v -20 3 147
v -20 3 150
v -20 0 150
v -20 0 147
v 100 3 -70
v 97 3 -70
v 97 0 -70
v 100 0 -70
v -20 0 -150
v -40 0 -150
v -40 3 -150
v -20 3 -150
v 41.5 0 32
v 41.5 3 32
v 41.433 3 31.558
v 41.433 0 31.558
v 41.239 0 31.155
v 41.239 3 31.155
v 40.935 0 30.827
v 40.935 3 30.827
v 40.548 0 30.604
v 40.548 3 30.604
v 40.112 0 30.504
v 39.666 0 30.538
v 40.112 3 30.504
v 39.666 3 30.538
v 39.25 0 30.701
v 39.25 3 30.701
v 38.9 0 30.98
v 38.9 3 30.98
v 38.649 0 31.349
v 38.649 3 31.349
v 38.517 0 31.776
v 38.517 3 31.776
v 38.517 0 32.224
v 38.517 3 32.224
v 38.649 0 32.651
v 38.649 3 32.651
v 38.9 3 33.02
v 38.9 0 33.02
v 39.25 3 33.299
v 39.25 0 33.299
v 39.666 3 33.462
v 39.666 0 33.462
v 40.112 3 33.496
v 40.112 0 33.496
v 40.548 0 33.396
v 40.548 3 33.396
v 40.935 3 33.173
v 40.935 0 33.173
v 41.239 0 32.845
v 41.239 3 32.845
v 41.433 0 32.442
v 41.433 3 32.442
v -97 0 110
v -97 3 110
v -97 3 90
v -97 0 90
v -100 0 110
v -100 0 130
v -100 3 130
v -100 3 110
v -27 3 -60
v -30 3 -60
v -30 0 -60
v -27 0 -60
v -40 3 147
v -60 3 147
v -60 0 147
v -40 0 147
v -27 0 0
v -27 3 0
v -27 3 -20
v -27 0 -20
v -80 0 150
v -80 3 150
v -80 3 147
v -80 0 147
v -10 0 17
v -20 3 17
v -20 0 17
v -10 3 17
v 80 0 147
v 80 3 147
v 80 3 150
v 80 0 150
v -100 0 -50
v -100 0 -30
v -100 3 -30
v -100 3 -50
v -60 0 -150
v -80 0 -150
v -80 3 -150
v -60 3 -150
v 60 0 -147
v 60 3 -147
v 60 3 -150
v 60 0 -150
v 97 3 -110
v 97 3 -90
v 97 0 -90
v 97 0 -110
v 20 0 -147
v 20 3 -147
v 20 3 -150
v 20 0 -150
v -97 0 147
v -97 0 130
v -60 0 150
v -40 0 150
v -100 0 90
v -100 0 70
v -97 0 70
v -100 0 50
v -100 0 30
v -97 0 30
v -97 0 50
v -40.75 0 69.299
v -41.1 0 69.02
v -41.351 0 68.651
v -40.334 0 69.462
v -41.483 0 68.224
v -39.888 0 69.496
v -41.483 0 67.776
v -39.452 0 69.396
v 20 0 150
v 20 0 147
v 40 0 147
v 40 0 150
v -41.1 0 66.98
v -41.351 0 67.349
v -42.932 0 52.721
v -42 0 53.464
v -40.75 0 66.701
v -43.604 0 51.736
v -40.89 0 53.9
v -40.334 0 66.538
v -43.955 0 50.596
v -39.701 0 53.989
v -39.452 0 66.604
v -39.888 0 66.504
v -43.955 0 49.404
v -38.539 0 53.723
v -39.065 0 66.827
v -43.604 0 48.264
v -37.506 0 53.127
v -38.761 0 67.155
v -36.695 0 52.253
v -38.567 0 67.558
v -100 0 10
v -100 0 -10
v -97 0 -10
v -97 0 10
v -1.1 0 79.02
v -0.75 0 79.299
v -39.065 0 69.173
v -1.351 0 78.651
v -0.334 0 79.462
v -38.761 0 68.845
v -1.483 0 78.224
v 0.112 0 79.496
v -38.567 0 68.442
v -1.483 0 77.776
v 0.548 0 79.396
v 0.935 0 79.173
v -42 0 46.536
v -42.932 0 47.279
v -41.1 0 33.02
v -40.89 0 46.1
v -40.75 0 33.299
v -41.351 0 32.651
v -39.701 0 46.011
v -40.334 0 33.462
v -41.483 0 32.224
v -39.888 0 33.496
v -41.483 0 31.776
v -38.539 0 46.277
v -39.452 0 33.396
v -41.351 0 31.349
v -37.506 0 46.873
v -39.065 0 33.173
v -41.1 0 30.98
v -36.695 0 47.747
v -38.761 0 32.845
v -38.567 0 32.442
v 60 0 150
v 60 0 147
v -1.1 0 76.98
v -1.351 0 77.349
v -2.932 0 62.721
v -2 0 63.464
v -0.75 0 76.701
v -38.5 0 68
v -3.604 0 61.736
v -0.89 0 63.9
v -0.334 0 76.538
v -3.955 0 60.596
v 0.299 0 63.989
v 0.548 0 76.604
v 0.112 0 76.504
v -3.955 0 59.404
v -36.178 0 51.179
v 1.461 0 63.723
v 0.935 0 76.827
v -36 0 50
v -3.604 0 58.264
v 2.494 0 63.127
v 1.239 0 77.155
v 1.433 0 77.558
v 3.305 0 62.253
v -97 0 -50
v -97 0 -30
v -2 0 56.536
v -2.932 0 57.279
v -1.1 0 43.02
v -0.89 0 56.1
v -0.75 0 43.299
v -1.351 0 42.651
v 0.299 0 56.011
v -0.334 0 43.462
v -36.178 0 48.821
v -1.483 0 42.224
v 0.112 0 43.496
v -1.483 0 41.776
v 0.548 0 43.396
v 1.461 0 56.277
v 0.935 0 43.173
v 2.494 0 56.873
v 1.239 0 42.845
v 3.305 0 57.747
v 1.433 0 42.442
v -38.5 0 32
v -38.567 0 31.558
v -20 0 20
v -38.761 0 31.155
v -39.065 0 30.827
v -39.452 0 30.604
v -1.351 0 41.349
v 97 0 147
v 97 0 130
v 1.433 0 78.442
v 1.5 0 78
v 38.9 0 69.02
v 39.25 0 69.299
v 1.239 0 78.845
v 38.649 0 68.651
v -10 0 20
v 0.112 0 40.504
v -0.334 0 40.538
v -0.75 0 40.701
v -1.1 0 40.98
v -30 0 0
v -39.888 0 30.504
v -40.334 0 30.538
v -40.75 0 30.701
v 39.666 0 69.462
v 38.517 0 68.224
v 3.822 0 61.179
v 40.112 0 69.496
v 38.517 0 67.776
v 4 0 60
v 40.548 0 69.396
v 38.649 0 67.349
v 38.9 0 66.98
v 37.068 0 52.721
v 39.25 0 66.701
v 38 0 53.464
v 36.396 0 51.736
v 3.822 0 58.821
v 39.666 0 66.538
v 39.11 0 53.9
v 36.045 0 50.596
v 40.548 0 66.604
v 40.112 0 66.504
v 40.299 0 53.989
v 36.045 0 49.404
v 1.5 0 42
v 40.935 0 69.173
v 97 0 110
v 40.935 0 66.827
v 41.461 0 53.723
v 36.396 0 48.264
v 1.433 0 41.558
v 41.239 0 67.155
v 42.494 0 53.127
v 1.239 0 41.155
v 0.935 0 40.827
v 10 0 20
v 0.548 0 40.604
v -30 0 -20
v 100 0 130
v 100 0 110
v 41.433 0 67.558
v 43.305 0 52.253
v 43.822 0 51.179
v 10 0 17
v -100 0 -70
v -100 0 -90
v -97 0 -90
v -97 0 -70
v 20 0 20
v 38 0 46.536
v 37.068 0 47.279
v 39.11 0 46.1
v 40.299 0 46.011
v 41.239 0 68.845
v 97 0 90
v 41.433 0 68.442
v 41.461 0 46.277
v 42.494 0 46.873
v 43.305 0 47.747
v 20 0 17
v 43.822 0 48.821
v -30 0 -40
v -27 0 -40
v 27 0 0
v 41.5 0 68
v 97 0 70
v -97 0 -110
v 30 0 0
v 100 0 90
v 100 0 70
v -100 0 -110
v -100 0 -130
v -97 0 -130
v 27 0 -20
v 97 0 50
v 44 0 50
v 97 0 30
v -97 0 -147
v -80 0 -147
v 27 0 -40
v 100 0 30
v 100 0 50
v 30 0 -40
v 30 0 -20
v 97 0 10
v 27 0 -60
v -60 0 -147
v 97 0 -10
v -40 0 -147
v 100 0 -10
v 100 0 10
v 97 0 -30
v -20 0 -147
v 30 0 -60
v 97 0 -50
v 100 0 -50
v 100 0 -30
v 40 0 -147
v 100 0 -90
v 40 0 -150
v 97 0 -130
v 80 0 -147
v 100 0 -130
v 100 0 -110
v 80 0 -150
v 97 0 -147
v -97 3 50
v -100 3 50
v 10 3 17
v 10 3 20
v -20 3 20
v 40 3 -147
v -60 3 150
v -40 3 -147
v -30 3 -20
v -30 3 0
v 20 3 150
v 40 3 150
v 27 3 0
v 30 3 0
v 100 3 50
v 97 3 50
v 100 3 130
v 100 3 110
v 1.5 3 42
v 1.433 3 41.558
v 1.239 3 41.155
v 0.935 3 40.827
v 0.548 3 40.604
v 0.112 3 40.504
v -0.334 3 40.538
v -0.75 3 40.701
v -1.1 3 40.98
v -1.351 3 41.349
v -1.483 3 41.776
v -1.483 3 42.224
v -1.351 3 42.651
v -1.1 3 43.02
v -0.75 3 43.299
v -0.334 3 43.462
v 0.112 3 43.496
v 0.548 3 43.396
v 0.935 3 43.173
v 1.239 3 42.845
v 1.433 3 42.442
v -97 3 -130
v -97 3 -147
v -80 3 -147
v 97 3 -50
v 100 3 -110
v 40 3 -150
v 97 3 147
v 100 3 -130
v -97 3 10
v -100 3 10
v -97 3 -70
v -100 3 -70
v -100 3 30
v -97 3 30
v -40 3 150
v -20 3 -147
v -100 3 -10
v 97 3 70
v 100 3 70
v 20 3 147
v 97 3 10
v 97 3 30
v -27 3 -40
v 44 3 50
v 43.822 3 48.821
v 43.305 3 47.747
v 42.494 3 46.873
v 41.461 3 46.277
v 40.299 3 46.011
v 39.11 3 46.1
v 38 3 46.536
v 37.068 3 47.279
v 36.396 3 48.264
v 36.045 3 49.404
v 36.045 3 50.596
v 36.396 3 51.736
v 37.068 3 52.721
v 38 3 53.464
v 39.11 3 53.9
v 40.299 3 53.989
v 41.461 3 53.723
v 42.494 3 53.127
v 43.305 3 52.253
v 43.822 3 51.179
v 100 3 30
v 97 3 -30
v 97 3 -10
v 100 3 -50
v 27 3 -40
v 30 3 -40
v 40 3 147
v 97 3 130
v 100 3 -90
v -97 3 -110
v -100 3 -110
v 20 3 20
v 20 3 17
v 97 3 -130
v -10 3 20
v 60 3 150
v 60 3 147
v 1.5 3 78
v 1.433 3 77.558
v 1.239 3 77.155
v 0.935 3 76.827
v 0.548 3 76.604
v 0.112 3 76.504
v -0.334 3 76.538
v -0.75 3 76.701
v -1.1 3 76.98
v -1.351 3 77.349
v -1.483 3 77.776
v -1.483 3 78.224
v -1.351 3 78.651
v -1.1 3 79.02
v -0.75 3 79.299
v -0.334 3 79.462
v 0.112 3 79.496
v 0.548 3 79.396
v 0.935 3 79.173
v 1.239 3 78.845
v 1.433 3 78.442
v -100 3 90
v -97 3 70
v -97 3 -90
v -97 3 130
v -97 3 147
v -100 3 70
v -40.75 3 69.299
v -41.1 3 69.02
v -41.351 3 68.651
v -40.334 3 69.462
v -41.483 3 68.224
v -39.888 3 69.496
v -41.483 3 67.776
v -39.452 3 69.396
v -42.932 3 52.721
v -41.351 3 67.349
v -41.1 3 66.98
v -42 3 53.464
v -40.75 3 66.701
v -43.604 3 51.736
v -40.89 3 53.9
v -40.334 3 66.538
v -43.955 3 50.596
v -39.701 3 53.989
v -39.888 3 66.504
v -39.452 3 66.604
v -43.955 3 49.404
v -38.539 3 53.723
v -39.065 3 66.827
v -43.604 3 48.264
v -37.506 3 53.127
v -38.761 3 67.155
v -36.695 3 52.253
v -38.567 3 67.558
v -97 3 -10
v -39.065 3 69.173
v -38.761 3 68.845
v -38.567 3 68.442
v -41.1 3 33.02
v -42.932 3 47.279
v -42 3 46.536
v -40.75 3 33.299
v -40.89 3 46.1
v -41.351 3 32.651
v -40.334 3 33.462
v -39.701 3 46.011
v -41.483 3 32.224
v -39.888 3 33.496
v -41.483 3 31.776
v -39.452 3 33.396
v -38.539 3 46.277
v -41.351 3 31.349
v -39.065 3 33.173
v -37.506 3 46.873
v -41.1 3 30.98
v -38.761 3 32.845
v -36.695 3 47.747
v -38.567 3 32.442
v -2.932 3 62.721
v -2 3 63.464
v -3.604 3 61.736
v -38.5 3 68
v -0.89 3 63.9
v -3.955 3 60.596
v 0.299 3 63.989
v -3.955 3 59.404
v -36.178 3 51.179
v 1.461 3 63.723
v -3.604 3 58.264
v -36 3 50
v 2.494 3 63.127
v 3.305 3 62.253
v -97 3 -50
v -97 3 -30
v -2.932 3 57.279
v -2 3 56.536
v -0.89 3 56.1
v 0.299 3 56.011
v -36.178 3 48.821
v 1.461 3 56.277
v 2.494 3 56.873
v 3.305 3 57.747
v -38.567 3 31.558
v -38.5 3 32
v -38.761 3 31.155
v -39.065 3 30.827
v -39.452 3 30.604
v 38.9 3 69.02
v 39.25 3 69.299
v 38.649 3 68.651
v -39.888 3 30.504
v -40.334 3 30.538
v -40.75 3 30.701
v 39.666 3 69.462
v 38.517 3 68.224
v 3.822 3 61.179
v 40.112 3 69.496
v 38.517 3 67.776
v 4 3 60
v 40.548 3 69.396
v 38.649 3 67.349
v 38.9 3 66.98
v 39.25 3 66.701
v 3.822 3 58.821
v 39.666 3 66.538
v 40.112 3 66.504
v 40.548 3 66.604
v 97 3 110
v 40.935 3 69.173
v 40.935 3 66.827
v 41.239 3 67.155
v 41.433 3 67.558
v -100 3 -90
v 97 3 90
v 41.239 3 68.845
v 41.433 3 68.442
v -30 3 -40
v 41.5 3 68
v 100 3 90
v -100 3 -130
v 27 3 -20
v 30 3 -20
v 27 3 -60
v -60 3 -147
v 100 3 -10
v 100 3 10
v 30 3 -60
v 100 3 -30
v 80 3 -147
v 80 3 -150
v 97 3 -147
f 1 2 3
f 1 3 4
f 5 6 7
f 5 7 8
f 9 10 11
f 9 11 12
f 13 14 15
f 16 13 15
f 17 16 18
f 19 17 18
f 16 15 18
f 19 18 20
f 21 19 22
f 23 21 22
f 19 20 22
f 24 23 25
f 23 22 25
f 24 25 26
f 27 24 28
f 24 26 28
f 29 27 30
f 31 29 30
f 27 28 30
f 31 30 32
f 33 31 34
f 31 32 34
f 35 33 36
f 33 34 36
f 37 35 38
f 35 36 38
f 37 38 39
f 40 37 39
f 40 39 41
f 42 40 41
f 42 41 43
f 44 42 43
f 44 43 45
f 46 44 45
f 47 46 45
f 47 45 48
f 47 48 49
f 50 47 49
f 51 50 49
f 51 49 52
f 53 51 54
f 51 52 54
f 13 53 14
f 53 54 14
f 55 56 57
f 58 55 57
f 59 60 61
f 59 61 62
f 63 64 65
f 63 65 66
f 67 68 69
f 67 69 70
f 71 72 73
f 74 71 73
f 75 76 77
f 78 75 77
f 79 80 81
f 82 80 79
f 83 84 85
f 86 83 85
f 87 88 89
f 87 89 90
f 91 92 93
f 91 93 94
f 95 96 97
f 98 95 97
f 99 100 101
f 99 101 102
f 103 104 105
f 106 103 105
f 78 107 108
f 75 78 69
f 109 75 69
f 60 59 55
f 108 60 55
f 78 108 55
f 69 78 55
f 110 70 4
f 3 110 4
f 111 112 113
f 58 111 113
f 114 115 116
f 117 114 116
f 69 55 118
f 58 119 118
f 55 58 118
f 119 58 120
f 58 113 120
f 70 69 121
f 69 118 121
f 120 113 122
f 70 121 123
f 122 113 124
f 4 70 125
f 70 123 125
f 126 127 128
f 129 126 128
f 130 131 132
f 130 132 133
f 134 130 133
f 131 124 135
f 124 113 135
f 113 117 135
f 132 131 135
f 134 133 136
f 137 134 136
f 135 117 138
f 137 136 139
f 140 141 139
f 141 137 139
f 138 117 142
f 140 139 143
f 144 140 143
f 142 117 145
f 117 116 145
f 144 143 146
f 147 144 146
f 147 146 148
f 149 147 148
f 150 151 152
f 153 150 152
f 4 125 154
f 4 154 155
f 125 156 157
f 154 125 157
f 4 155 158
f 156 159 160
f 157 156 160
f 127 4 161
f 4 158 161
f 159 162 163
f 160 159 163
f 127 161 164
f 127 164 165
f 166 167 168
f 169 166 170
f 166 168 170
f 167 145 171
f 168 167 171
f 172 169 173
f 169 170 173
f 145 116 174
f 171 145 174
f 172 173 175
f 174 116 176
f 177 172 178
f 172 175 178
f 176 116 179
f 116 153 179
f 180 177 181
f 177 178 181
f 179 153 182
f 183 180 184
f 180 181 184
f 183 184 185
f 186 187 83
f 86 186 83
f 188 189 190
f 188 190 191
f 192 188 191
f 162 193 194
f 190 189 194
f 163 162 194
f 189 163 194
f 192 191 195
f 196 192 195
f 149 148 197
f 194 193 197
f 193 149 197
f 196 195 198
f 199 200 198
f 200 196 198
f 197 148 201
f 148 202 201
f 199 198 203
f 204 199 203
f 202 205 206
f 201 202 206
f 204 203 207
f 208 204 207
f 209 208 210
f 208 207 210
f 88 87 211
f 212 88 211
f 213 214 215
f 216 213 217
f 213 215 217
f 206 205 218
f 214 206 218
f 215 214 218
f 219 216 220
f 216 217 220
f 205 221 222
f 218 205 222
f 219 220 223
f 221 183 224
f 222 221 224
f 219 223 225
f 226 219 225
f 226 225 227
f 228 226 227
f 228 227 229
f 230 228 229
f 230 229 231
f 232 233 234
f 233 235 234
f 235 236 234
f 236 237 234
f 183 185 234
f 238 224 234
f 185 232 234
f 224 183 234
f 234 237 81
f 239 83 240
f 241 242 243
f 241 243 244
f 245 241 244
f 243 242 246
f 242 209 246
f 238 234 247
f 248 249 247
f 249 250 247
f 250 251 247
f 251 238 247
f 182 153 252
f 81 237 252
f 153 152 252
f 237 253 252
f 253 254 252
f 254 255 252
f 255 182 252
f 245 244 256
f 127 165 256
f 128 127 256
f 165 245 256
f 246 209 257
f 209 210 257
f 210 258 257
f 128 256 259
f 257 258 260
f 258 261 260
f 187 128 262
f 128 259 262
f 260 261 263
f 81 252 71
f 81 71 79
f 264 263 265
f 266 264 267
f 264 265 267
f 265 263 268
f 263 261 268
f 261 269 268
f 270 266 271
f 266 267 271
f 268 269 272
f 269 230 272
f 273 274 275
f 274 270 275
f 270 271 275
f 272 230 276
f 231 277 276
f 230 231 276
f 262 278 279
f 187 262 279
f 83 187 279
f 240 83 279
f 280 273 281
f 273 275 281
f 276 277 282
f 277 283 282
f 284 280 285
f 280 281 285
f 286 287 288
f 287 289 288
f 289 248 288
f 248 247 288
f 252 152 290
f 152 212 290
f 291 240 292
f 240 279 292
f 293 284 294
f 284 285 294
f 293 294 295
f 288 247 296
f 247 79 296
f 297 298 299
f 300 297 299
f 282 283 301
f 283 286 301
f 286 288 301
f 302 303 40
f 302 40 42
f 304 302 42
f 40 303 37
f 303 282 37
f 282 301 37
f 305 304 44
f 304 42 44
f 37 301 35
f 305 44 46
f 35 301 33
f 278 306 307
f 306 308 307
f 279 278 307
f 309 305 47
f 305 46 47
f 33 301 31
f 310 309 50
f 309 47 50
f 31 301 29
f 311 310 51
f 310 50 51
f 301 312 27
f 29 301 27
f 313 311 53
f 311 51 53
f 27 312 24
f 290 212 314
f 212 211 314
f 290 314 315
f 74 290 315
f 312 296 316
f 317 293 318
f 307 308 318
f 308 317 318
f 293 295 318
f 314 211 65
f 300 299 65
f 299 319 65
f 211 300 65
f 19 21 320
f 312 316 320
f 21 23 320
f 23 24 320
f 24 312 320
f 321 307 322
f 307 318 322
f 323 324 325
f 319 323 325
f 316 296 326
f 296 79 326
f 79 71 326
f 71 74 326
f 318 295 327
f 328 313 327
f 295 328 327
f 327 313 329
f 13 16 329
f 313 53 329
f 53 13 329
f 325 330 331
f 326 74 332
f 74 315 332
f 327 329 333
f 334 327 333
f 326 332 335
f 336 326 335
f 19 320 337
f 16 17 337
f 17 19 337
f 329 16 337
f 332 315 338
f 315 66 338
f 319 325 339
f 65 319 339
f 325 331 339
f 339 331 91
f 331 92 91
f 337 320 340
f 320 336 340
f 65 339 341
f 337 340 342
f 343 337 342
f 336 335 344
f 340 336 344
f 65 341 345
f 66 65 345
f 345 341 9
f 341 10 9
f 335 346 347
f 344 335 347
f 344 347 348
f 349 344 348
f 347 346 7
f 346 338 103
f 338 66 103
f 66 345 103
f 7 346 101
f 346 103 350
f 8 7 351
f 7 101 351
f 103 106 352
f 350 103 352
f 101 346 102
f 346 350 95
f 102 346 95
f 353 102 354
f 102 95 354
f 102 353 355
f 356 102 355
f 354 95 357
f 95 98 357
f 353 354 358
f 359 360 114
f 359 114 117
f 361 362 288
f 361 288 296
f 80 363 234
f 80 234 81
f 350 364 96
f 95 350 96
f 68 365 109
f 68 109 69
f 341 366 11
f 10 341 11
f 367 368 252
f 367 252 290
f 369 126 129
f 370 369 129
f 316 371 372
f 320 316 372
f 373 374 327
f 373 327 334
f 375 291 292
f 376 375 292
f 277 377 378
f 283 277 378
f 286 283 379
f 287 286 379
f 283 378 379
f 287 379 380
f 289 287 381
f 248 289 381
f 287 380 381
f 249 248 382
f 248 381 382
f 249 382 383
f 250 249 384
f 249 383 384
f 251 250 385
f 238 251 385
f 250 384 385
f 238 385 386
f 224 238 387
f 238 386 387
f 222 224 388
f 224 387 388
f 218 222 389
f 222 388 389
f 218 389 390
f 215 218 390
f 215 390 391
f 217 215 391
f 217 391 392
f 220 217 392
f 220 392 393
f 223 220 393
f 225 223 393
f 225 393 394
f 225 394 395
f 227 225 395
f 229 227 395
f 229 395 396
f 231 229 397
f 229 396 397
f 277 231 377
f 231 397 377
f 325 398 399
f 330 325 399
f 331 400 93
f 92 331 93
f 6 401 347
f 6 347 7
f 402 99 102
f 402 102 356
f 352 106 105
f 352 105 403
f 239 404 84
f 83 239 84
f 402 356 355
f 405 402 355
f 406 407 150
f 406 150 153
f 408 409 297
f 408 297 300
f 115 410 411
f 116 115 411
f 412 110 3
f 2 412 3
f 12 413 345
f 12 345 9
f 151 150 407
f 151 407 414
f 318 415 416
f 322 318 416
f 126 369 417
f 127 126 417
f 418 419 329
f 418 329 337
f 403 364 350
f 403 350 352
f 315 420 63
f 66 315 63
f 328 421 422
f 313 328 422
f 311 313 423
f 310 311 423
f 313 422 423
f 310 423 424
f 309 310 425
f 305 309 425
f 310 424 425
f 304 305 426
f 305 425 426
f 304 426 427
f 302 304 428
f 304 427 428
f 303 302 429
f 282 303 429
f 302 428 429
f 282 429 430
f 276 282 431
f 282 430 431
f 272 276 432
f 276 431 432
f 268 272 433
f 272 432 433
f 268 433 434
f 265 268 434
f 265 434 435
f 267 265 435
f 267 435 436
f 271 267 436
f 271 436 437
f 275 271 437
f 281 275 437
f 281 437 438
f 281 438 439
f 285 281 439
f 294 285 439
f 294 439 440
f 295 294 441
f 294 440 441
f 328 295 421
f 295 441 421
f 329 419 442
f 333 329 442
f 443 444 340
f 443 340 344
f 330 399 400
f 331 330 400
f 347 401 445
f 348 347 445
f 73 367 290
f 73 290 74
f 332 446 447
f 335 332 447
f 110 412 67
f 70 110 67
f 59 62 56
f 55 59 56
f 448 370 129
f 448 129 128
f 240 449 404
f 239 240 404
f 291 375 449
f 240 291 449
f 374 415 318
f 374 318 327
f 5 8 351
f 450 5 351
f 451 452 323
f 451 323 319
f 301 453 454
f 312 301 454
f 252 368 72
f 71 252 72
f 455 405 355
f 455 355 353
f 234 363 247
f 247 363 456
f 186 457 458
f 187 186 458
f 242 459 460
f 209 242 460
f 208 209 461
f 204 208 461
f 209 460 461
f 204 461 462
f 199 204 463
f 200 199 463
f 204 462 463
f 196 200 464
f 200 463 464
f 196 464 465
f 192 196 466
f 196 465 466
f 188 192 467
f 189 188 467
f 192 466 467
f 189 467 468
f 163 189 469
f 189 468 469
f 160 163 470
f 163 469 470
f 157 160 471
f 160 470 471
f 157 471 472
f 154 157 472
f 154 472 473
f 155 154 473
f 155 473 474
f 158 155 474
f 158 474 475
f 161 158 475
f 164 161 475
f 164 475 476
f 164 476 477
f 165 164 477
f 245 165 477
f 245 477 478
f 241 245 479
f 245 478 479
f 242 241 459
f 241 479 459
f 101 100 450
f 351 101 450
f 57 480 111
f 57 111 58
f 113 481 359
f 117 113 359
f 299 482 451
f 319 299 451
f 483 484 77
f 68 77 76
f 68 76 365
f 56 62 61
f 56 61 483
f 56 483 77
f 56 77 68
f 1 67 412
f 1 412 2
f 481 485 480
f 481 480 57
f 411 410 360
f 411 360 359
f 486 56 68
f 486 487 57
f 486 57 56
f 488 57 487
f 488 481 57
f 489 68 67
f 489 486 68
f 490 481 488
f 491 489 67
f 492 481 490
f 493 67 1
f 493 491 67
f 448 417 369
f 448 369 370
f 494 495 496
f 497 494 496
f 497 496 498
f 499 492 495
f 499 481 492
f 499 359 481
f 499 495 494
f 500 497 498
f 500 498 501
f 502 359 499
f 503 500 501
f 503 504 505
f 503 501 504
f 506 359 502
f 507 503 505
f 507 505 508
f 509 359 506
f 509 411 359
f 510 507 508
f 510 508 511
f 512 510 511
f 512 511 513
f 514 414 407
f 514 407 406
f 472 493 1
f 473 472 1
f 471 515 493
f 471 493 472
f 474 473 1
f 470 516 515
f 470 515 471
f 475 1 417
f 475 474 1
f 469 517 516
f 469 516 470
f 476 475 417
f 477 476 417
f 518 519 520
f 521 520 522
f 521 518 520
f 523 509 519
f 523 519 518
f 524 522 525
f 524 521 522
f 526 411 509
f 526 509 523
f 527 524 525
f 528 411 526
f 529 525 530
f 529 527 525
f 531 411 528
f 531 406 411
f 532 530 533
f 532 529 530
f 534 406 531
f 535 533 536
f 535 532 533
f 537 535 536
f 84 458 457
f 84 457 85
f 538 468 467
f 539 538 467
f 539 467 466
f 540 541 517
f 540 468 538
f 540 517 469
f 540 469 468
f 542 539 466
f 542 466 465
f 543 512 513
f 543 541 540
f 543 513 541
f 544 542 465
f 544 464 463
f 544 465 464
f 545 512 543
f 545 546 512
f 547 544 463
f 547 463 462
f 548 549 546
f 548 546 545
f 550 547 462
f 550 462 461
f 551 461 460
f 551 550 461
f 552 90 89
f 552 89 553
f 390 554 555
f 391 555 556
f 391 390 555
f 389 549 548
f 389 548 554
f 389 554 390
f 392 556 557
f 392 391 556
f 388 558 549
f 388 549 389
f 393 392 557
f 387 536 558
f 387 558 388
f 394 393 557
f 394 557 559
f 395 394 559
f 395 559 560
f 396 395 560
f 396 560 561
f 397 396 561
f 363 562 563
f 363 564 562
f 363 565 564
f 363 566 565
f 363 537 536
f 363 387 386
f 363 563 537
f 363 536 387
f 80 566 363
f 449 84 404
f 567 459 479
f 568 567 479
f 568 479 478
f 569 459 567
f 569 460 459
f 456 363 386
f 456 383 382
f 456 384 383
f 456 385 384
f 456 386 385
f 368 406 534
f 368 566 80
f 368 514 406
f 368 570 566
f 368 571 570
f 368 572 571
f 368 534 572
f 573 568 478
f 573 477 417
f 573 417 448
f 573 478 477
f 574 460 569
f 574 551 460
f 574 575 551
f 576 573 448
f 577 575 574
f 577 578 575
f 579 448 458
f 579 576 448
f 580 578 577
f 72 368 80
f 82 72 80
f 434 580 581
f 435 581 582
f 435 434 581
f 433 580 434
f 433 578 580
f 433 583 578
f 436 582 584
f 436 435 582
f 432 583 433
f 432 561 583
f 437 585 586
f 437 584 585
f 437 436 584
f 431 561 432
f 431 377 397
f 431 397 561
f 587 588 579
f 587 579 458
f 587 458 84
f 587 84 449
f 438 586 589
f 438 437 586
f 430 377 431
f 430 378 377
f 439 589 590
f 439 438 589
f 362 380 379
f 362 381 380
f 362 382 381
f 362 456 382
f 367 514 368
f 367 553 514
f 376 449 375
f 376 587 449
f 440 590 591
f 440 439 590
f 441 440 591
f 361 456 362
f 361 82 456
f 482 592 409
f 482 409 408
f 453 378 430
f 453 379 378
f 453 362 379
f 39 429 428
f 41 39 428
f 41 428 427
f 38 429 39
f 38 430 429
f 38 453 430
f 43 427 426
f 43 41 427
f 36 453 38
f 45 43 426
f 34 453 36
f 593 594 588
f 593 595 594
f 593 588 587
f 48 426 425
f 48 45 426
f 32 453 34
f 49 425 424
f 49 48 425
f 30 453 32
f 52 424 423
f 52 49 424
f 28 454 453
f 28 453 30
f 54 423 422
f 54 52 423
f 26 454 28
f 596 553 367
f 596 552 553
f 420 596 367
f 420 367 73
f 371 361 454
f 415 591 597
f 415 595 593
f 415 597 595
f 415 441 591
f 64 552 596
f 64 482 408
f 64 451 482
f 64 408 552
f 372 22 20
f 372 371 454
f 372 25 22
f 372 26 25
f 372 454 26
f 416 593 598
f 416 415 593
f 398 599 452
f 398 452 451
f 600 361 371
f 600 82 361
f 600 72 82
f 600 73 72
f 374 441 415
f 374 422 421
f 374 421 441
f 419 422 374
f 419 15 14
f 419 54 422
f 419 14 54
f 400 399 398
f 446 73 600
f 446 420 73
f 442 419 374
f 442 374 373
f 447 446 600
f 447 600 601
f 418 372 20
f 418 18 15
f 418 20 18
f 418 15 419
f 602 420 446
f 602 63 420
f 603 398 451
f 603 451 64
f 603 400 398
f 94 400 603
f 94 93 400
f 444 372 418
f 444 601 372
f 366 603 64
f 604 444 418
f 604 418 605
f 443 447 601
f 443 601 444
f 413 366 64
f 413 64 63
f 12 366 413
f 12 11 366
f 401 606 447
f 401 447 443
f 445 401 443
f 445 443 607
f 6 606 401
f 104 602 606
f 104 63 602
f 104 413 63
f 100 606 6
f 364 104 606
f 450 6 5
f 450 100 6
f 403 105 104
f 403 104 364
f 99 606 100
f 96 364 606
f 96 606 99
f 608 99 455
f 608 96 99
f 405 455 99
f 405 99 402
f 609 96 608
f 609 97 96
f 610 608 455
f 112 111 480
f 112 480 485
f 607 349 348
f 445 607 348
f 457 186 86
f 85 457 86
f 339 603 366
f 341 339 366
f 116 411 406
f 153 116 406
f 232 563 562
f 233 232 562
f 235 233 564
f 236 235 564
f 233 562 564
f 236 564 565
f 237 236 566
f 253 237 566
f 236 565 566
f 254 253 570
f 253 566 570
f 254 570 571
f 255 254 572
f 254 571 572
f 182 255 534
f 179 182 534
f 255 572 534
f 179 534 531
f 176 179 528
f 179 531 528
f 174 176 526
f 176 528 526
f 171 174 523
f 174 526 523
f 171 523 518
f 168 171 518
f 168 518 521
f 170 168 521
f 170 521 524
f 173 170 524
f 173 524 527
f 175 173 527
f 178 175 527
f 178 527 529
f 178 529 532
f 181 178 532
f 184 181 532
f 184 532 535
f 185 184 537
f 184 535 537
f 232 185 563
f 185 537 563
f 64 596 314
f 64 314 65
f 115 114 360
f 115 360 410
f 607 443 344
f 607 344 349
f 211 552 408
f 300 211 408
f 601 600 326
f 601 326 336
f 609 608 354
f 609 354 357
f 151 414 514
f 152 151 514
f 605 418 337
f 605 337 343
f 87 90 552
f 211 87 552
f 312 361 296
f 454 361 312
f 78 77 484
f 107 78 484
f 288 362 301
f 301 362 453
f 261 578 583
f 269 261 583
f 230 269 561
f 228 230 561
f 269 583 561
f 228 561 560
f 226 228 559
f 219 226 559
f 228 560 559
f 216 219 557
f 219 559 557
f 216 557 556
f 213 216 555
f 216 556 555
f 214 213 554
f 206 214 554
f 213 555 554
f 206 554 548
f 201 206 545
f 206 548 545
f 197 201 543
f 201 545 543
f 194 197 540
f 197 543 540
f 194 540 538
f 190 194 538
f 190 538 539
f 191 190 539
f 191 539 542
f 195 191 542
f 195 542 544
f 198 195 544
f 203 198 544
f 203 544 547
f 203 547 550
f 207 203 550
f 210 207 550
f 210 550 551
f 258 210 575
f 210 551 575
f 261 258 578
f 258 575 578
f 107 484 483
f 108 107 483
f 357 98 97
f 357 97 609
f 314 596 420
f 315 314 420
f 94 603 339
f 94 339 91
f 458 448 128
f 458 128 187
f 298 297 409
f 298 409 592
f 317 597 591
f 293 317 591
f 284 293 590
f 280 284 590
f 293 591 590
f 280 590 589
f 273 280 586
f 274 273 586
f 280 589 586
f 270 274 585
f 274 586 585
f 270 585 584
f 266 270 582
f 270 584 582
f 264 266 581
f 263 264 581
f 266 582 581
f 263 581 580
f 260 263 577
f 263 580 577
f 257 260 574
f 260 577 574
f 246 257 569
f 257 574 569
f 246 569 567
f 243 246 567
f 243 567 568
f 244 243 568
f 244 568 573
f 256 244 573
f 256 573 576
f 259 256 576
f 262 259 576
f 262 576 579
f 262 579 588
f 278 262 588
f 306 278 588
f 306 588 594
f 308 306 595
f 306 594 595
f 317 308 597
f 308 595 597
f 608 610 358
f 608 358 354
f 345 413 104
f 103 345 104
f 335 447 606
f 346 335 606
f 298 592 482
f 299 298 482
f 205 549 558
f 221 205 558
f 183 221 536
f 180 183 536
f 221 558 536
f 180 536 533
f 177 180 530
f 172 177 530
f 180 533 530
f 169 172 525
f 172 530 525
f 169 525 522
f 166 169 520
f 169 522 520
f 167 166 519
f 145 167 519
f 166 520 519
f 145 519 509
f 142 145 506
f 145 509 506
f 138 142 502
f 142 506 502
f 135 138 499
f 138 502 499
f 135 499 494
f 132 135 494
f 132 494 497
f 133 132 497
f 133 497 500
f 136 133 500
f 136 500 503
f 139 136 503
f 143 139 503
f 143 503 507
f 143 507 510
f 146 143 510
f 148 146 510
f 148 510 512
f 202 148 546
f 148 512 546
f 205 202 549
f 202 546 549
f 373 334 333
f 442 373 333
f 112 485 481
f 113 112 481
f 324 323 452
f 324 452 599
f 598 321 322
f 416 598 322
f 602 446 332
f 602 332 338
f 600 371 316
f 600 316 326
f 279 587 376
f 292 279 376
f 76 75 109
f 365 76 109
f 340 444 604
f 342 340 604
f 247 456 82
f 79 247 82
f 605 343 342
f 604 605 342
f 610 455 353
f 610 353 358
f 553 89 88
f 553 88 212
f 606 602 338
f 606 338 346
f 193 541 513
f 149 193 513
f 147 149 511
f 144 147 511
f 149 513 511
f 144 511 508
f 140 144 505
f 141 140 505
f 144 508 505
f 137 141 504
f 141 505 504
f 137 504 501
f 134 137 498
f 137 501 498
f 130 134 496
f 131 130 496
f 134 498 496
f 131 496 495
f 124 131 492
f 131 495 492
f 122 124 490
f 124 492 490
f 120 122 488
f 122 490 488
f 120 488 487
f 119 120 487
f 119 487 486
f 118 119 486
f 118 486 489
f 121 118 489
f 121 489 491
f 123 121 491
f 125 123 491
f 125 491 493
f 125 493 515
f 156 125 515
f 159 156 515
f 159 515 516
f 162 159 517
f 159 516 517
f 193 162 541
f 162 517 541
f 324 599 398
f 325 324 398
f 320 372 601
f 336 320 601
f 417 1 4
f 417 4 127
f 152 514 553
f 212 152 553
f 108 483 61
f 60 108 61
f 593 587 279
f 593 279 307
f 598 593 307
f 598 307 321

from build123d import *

# Parameters (mm, degrees)
SKETCH1_W           = 200
SKETCH1_H           = 300
BOSS_EXTRUDE1_DEPTH = 3
SKETCH2_W           = 3
SKETCH2_H           = 20
SKETCH2_W_2         = 10
SKETCH2_H_2         = 3
CUT_EXTRUDE1_DEPTH  = 3
SKETCH3_W           = 3
SKETCH3_H           = 20
SKETCH3_W_2         = 20
SKETCH3_H_2         = 3
SKETCH3_W_3         = 40
CUT_EXTRUDE2_DEPTH  = 3
SKETCH4_R           = 4
SKETCH4_R_2         = 1.5
CUT_EXTRUDE3_DEPTH  = 3


with BuildPart() as part:
    # Sketch1 → Boss-Extrude1 (new body)
    with BuildSketch(Plane(origin=(0, 0, 0), x_dir=(1, 0, 0), z_dir=(0, 1, 0))):
        Rectangle(SKETCH1_W, SKETCH1_H)
    extrude(amount=BOSS_EXTRUDE1_DEPTH)

    # Sketch2 → Cut-Extrude1 (cut)
    with BuildSketch(Plane(origin=(0, 3, 0), x_dir=(1, 0, 0), z_dir=(0, 1, 0))):
        with Locations((-28.5, 10)):
            Rectangle(SKETCH2_W, SKETCH2_H)
        with Locations((28.5, 10)):
            Rectangle(SKETCH2_W, SKETCH2_H)
        with Locations((15, -18.5)):
            Rectangle(SKETCH2_W_2, SKETCH2_H_2)
        with Locations((28.5, 50)):
            Rectangle(SKETCH2_W, SKETCH2_H)
        with Locations((-28.5, 50)):
            Rectangle(SKETCH2_W, SKETCH2_H)
        with Locations((-15, -18.5)):
            Rectangle(SKETCH2_W_2, SKETCH2_H_2)
    extrude(amount=-CUT_EXTRUDE1_DEPTH, mode=Mode.SUBTRACT)

    # Sketch3 → Cut-Extrude2 (cut)
    with BuildSketch(Plane(origin=(0, 3, 0), x_dir=(1, 0, 0), z_dir=(0, 1, 0))):
        Polygon((100, 130), (97, 130), (97, 147), (80, 147), (80, 150), (100, 150), align=None)
        with Locations((98.5, 100)):
            Rectangle(SKETCH3_W, SKETCH3_H)
        with Locations((98.5, 60)):
            Rectangle(SKETCH3_W, SKETCH3_H)
        Polygon((-100, 150), (-100, 130), (-97, 130), (-97, 147), (-80, 147), (-80, 150), align=None)
        Polygon((-100, -150), (-80, -150), (-80, -147), (-97, -147), (-97, -130), (-100, -130), align=None)
        Polygon((100, -150), (100, -130), (97, -130), (97, -147), (80, -147), (80, -150), align=None)
        with Locations((98.5, 20)):
            Rectangle(SKETCH3_W, SKETCH3_H)
        with Locations((98.5, -20)):
            Rectangle(SKETCH3_W, SKETCH3_H)
        with Locations((98.5, -60)):
            Rectangle(SKETCH3_W, SKETCH3_H)
        with Locations((98.5, -100)):
            Rectangle(SKETCH3_W, SKETCH3_H)
        with Locations((-98.5, 100)):
            Rectangle(SKETCH3_W, SKETCH3_H)
        with Locations((-98.5, 60)):
            Rectangle(SKETCH3_W, SKETCH3_H)
        with Locations((-98.5, 20)):
            Rectangle(SKETCH3_W, SKETCH3_H)
        with Locations((-98.5, -20)):
            Rectangle(SKETCH3_W, SKETCH3_H)
        with Locations((-98.5, -60)):
            Rectangle(SKETCH3_W, SKETCH3_H)
        with Locations((-98.5, -100)):
            Rectangle(SKETCH3_W, SKETCH3_H)
        with Locations((-50, 148.5)):
            Rectangle(SKETCH3_W_2, SKETCH3_H_2)
        with Locations((0, 148.5)):
            Rectangle(SKETCH3_W_3, SKETCH3_H_2)
        with Locations((50, 148.5)):
            Rectangle(SKETCH3_W_2, SKETCH3_H_2)
        with Locations((50, -148.5)):
            Rectangle(SKETCH3_W_2, SKETCH3_H_2)
        with Locations((0, -148.5)):
            Rectangle(SKETCH3_W_3, SKETCH3_H_2)
        with Locations((-50, -148.5)):
            Rectangle(SKETCH3_W_2, SKETCH3_H_2)
    extrude(amount=-CUT_EXTRUDE2_DEPTH, mode=Mode.SUBTRACT)

    # Sketch4 → Cut-Extrude3 (cut)
    with BuildSketch(Plane(origin=(0, 3, 0), x_dir=(1, 0, 0), z_dir=(0, 1, 0))):
        with Locations((0, -60)):
            Circle(SKETCH4_R)
        with Locations((40, -50)):
            Circle(SKETCH4_R)
        with Locations((-40, -50)):
            Circle(SKETCH4_R)
        with Locations((40, -32)):
            Circle(SKETCH4_R_2)
        with Locations((40, -68)):
            Circle(SKETCH4_R_2)
        with Locations((0, -42)):
            Circle(SKETCH4_R_2)
        with Locations((0, -78)):
            Circle(SKETCH4_R_2)
        with Locations((-40, -32)):
            Circle(SKETCH4_R_2)
        with Locations((-40, -68)):
            Circle(SKETCH4_R_2)
    extrude(amount=-CUT_EXTRUDE3_DEPTH, mode=Mode.SUBTRACT)


solid = part.part
